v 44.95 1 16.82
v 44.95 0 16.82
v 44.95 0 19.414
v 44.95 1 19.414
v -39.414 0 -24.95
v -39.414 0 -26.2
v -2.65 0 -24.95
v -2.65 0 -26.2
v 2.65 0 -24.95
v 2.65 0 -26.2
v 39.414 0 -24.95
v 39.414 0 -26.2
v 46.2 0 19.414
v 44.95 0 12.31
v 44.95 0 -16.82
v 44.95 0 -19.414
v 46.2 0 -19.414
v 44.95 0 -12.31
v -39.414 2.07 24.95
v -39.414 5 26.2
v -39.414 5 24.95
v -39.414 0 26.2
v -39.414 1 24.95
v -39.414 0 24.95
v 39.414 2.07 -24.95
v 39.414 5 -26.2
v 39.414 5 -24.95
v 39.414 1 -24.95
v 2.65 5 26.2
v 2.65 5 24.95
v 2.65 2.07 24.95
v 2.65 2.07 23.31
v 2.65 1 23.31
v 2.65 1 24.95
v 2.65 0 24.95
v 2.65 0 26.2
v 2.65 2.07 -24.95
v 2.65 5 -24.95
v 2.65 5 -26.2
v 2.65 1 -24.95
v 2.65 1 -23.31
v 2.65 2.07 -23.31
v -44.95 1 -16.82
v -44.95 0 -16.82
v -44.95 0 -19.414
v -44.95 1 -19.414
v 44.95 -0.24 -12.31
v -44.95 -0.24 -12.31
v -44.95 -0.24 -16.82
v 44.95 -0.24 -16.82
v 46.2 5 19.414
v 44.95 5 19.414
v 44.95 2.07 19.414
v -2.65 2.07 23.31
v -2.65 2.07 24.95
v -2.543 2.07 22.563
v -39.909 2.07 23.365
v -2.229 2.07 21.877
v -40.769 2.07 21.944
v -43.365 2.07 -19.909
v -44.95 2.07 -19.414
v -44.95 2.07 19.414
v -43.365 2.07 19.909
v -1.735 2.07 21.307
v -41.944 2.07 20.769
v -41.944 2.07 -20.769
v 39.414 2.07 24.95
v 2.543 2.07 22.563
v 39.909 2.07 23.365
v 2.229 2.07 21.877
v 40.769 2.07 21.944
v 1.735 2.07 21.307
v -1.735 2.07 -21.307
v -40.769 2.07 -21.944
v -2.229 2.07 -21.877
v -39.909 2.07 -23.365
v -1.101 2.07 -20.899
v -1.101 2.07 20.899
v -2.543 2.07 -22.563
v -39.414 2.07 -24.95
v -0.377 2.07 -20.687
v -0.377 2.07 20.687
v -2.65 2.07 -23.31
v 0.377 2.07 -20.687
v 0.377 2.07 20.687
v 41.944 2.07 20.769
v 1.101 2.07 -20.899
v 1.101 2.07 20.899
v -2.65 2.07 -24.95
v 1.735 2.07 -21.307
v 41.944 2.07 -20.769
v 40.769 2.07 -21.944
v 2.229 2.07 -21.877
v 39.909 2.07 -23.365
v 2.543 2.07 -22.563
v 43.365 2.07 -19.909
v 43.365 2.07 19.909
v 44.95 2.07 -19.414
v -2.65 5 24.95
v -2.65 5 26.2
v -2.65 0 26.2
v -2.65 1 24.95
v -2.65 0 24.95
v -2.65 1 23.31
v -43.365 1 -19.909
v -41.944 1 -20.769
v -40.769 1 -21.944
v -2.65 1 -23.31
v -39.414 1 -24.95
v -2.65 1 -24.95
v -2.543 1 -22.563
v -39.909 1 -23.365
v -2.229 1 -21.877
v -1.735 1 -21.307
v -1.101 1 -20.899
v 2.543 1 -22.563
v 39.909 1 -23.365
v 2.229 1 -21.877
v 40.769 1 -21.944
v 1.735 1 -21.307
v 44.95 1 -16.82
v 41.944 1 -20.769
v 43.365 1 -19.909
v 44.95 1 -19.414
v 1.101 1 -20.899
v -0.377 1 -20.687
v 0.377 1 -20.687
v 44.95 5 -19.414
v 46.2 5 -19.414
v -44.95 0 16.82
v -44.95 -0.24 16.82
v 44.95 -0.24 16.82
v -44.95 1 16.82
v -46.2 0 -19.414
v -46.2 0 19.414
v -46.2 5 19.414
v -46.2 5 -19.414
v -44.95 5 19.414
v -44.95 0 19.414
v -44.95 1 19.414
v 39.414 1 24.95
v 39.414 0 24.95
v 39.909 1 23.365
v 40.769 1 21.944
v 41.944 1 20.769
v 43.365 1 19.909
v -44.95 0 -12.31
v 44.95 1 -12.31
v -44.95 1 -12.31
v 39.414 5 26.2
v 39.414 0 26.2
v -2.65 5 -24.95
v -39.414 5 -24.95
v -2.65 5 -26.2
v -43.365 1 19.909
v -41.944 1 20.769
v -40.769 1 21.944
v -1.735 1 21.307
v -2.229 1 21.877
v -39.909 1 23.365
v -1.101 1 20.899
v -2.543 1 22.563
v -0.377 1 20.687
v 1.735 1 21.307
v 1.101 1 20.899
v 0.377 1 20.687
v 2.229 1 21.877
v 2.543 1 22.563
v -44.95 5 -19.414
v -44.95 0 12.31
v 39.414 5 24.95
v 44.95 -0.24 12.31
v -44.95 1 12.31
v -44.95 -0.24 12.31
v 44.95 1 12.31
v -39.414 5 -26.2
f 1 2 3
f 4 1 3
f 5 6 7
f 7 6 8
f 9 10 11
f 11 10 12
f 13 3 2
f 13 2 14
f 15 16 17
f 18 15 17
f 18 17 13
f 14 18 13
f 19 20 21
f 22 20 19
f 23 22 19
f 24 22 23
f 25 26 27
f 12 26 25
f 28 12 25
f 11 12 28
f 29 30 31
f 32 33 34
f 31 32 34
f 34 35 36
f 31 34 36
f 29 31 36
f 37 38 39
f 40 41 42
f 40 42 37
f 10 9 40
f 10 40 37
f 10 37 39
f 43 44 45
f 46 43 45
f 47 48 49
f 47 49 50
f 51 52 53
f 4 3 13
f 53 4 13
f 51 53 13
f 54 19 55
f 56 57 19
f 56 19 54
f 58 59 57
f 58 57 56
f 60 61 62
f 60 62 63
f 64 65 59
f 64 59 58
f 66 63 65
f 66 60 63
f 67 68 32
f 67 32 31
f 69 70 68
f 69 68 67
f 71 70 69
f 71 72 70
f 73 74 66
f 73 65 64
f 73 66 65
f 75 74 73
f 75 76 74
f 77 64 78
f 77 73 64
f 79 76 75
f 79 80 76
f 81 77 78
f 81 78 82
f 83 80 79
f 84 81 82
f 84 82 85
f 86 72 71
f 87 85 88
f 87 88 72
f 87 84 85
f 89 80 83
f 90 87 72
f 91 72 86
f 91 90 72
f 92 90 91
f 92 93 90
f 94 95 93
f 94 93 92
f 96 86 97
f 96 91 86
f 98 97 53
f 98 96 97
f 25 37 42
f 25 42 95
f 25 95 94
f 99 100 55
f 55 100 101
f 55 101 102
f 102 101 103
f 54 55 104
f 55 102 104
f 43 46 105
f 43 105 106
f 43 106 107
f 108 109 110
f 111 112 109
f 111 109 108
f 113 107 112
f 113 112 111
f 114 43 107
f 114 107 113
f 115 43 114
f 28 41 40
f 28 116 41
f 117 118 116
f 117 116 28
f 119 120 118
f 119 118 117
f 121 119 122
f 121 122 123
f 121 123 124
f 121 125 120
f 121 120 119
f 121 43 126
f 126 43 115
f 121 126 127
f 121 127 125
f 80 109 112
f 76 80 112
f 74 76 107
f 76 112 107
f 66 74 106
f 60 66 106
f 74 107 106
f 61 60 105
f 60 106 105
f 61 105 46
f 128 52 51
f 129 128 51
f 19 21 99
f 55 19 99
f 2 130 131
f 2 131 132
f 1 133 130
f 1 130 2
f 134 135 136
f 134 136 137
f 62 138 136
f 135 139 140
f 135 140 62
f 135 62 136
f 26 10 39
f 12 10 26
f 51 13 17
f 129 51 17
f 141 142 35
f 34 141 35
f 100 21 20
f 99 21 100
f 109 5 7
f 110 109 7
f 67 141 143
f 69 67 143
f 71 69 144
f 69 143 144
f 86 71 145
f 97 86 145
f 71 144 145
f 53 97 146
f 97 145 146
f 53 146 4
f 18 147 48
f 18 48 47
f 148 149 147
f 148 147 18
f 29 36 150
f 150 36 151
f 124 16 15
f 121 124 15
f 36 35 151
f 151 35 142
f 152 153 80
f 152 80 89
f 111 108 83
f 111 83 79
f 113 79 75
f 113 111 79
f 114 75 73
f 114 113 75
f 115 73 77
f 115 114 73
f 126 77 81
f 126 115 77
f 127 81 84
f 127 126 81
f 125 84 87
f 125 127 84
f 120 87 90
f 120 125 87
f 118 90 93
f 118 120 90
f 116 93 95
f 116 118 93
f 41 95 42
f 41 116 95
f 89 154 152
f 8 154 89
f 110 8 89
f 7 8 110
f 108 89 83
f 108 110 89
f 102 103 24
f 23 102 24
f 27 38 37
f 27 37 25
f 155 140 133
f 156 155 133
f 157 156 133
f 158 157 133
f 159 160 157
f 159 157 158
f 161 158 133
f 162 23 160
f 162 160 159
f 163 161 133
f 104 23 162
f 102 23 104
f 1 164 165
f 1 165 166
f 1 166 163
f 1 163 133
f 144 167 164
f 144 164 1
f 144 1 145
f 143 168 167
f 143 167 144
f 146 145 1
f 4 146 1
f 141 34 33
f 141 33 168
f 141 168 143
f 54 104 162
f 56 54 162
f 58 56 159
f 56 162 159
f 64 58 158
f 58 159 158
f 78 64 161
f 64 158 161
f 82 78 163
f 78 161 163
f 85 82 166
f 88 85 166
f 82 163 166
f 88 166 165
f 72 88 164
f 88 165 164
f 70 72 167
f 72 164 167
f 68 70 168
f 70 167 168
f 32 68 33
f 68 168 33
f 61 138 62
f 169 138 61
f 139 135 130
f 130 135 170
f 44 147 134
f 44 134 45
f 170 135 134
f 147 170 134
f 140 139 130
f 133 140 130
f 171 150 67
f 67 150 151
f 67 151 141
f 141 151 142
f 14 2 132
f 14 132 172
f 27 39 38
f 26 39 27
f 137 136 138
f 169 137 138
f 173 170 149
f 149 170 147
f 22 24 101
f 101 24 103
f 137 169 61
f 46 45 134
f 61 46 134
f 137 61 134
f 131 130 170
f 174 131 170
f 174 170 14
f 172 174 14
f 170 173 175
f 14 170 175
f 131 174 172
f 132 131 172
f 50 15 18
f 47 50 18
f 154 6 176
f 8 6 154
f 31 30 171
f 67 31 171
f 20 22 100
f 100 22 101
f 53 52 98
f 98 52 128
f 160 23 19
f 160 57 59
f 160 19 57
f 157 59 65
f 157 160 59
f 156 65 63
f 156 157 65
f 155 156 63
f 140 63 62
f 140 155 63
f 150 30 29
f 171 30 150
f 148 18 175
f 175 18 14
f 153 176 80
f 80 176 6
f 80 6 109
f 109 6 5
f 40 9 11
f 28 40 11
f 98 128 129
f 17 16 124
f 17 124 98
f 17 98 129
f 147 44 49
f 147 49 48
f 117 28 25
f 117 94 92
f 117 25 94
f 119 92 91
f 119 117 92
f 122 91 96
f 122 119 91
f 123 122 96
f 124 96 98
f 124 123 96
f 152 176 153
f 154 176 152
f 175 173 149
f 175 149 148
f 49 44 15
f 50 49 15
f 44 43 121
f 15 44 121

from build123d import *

# Parameters (mm, degrees)
CROQUIS1_W              = 92.4
CROQUIS1_H              = 52.4
SALIENTE_EXTRUIR1_DEPTH = 5
CROQUIS2_W              = 89.9
CROQUIS2_H              = 49.9
CORTAR_EXTRUIR1_DEPTH   = 2.93
CORTAR_EXTRUIR2_START   = -2.07
CORTAR_EXTRUIR2_DEPTH   = 5
CORTAR_EXTRUIR3_START   = -2.07
CORTAR_EXTRUIR3_DEPTH   = 5
SIMETR_A2_START         = -2.07
SIMETR_A2_COPY_1_DEPTH  = 5
CORTAR_EXTRUIR5_DEPTH   = 1
CROQUIS7_W              = 89.9
CROQUIS7_H              = 4.51
SALIENTE_EXTRUIR2_DEPTH = 1.24


with BuildPart() as part:
    # Croquis1 → Saliente-Extruir1 (new body)
    with BuildSketch(Plane(origin=(0, 0, 0), x_dir=(1, 0, 0), z_dir=(0, 1, 0))):
        Rectangle(CROQUIS1_W, CROQUIS1_H)
    extrude(amount=SALIENTE_EXTRUIR1_DEPTH)

    # Croquis2 → Cortar-Extruir1 (cut)
    with BuildSketch(Plane(origin=(0, 5, 0), x_dir=(1, 0, 0), z_dir=(0, 1, 0))):
        Rectangle(CROQUIS2_W, CROQUIS2_H)
    extrude(amount=-CORTAR_EXTRUIR1_DEPTH, mode=Mode.SUBTRACT)

    # Croquis3 → Cortar-Extruir2 (cut)
    with BuildSketch(Plane(origin=(0, 2.07, 0), x_dir=(1, 0, 0), z_dir=(0, 1, 0)).offset(CORTAR_EXTRUIR2_START)):
        with BuildLine():
            Line((2.65, -23.31), (2.65, -26.2))
            Line((2.65, -26.2), (-2.65, -26.2))
            Line((-2.65, -26.2), (-2.65, -23.31))
            ThreePointArc((-2.65, -23.31), (0, -20.66), (2.65, -23.31))
        make_face()
    cortar_extruir2 = extrude(amount=CORTAR_EXTRUIR2_DEPTH, mode=Mode.SUBTRACT)

    # Croquis4 → Cortar-Extruir3 (cut)
    with BuildSketch(Plane(origin=(0, 2.07, 0), x_dir=(1, 0, 0), z_dir=(0, 1, 0)).offset(CORTAR_EXTRUIR3_START)):
        with BuildLine():
            Line((-46.2, -19.414169174), (-46.2, -26.2))
            Line((-46.2, -26.2), (-39.414169174, -26.2))
            Line((-39.414169174, -26.2), (-39.414169174, -24.95))
            ThreePointArc((-39.414169174, -24.95), (-41.32096321, -21.32096321), (-44.95, -19.414169174))
            Line((-44.95, -19.414169174), (-46.2, -19.414169174))
        make_face()
    cortar_extruir3 = extrude(amount=CORTAR_EXTRUIR3_DEPTH, mode=Mode.SUBTRACT)

    # Simetría1: Cortar-Extruir3 across plane
    add(cortar_extruir3.mirror(Plane(origin=(0, 0, 0), x_dir=(0, 0, 1), z_dir=(1, 0, 0))), mode=Mode.SUBTRACT)

    # Simetría2: Cortar-Extruir3 across plane
    add(cortar_extruir3.mirror(Plane.XY), mode=Mode.SUBTRACT)

    # Simetría2 copy 1 sketch → Simetría2 copy 1 (cut)
    with BuildSketch(Plane(origin=(0, 2.07, 0), x_dir=(-1, 0, 0), z_dir=(0, 1, 0)).offset(SIMETR_A2_START)):
        with BuildLine():
            Line((-46.2, -19.414169174), (-46.2, -26.2))
            Line((-46.2, -26.2), (-39.414169174, -26.2))
            Line((-39.414169174, -26.2), (-39.414169174, -24.95))
            ThreePointArc((-39.414169174, -24.95), (-41.32096321, -21.32096321), (-44.95, -19.414169174))
            Line((-44.95, -19.414169174), (-46.2, -19.414169174))
        make_face()
    extrude(amount=SIMETR_A2_COPY_1_DEPTH, mode=Mode.SUBTRACT)

    # Simetría3: Cortar-Extruir2 across plane
    add(cortar_extruir2.mirror(Plane.XY), mode=Mode.SUBTRACT)

    # Croquis6 → Cortar-Extruir5 (cut)
    with BuildSketch(Plane.XZ):
        with BuildLine():
            Line((2.65, -24.95), (3.9, -24.95))
            Line((3.9, -24.95), (38.164169174, -24.95))
            Line((38.164169174, -24.95), (39.414169174, -24.95))
            ThreePointArc((39.414169174, -24.95), (41.32096321, -21.32096321), (44.95, -19.414169174))
            Line((44.95, -19.414169174), (44.95, -18.164169174))
            Line((44.95, -18.164169174), (44.95, 18.164169174))
            Line((44.95, 18.164169174), (44.95, 19.414169174))
            ThreePointArc((44.95, 19.414169174), (41.32096321, 21.32096321), (39.414169174, 24.95))
            Line((39.414169174, 24.95), (38.164169174, 24.95))
            Line((38.164169174, 24.95), (3.9, 24.95))
            Line((3.9, 24.95), (2.65, 24.95))
            Line((2.65, 24.95), (2.65, 23.31))
            ThreePointArc((2.65, 23.31), (0, 20.66), (-2.65, 23.31))
            Line((-2.65, 23.31), (-2.65, 24.95))
            Line((-2.65, 24.95), (-3.9, 24.95))
            Line((-3.9, 24.95), (-38.164169174, 24.95))
            Line((-38.164169174, 24.95), (-39.414169174, 24.95))
            ThreePointArc((-39.414169174, 24.95), (-41.32096321, 21.32096321), (-44.95, 19.414169174))
            Line((-44.95, 19.414169174), (-44.95, 18.164169174))
            Line((-44.95, 18.164169174), (-44.95, -18.164169174))
            Line((-44.95, -18.164169174), (-44.95, -19.414169174))
            ThreePointArc((-44.95, -19.414169174), (-41.32096321, -21.32096321), (-39.414169174, -24.95))
            Line((-39.414169174, -24.95), (-38.164169174, -24.95))
            Line((-38.164169174, -24.95), (-3.9, -24.95))
            Line((-3.9, -24.95), (-2.65, -24.95))
            Line((-2.65, -24.95), (-2.65, -23.31))
            ThreePointArc((-2.65, -23.31), (0, -20.66), (2.65, -23.31))
            Line((2.65, -23.31), (2.65, -24.95))
        make_face()
    extrude(amount=-CORTAR_EXTRUIR5_DEPTH, mode=Mode.SUBTRACT)

    # Croquis7 → Saliente-Extruir2 (add)
    with BuildSketch(Plane.XZ.offset(-1)):
        with Locations((0, -14.565)):
            Rectangle(CROQUIS7_W, CROQUIS7_H)
    saliente_extruir2 = extrude(amount=SALIENTE_EXTRUIR2_DEPTH)

    # Simetría4: Saliente-Extruir2 across plane
    add(saliente_extruir2.mirror(Plane.XY))


solid = part.part
